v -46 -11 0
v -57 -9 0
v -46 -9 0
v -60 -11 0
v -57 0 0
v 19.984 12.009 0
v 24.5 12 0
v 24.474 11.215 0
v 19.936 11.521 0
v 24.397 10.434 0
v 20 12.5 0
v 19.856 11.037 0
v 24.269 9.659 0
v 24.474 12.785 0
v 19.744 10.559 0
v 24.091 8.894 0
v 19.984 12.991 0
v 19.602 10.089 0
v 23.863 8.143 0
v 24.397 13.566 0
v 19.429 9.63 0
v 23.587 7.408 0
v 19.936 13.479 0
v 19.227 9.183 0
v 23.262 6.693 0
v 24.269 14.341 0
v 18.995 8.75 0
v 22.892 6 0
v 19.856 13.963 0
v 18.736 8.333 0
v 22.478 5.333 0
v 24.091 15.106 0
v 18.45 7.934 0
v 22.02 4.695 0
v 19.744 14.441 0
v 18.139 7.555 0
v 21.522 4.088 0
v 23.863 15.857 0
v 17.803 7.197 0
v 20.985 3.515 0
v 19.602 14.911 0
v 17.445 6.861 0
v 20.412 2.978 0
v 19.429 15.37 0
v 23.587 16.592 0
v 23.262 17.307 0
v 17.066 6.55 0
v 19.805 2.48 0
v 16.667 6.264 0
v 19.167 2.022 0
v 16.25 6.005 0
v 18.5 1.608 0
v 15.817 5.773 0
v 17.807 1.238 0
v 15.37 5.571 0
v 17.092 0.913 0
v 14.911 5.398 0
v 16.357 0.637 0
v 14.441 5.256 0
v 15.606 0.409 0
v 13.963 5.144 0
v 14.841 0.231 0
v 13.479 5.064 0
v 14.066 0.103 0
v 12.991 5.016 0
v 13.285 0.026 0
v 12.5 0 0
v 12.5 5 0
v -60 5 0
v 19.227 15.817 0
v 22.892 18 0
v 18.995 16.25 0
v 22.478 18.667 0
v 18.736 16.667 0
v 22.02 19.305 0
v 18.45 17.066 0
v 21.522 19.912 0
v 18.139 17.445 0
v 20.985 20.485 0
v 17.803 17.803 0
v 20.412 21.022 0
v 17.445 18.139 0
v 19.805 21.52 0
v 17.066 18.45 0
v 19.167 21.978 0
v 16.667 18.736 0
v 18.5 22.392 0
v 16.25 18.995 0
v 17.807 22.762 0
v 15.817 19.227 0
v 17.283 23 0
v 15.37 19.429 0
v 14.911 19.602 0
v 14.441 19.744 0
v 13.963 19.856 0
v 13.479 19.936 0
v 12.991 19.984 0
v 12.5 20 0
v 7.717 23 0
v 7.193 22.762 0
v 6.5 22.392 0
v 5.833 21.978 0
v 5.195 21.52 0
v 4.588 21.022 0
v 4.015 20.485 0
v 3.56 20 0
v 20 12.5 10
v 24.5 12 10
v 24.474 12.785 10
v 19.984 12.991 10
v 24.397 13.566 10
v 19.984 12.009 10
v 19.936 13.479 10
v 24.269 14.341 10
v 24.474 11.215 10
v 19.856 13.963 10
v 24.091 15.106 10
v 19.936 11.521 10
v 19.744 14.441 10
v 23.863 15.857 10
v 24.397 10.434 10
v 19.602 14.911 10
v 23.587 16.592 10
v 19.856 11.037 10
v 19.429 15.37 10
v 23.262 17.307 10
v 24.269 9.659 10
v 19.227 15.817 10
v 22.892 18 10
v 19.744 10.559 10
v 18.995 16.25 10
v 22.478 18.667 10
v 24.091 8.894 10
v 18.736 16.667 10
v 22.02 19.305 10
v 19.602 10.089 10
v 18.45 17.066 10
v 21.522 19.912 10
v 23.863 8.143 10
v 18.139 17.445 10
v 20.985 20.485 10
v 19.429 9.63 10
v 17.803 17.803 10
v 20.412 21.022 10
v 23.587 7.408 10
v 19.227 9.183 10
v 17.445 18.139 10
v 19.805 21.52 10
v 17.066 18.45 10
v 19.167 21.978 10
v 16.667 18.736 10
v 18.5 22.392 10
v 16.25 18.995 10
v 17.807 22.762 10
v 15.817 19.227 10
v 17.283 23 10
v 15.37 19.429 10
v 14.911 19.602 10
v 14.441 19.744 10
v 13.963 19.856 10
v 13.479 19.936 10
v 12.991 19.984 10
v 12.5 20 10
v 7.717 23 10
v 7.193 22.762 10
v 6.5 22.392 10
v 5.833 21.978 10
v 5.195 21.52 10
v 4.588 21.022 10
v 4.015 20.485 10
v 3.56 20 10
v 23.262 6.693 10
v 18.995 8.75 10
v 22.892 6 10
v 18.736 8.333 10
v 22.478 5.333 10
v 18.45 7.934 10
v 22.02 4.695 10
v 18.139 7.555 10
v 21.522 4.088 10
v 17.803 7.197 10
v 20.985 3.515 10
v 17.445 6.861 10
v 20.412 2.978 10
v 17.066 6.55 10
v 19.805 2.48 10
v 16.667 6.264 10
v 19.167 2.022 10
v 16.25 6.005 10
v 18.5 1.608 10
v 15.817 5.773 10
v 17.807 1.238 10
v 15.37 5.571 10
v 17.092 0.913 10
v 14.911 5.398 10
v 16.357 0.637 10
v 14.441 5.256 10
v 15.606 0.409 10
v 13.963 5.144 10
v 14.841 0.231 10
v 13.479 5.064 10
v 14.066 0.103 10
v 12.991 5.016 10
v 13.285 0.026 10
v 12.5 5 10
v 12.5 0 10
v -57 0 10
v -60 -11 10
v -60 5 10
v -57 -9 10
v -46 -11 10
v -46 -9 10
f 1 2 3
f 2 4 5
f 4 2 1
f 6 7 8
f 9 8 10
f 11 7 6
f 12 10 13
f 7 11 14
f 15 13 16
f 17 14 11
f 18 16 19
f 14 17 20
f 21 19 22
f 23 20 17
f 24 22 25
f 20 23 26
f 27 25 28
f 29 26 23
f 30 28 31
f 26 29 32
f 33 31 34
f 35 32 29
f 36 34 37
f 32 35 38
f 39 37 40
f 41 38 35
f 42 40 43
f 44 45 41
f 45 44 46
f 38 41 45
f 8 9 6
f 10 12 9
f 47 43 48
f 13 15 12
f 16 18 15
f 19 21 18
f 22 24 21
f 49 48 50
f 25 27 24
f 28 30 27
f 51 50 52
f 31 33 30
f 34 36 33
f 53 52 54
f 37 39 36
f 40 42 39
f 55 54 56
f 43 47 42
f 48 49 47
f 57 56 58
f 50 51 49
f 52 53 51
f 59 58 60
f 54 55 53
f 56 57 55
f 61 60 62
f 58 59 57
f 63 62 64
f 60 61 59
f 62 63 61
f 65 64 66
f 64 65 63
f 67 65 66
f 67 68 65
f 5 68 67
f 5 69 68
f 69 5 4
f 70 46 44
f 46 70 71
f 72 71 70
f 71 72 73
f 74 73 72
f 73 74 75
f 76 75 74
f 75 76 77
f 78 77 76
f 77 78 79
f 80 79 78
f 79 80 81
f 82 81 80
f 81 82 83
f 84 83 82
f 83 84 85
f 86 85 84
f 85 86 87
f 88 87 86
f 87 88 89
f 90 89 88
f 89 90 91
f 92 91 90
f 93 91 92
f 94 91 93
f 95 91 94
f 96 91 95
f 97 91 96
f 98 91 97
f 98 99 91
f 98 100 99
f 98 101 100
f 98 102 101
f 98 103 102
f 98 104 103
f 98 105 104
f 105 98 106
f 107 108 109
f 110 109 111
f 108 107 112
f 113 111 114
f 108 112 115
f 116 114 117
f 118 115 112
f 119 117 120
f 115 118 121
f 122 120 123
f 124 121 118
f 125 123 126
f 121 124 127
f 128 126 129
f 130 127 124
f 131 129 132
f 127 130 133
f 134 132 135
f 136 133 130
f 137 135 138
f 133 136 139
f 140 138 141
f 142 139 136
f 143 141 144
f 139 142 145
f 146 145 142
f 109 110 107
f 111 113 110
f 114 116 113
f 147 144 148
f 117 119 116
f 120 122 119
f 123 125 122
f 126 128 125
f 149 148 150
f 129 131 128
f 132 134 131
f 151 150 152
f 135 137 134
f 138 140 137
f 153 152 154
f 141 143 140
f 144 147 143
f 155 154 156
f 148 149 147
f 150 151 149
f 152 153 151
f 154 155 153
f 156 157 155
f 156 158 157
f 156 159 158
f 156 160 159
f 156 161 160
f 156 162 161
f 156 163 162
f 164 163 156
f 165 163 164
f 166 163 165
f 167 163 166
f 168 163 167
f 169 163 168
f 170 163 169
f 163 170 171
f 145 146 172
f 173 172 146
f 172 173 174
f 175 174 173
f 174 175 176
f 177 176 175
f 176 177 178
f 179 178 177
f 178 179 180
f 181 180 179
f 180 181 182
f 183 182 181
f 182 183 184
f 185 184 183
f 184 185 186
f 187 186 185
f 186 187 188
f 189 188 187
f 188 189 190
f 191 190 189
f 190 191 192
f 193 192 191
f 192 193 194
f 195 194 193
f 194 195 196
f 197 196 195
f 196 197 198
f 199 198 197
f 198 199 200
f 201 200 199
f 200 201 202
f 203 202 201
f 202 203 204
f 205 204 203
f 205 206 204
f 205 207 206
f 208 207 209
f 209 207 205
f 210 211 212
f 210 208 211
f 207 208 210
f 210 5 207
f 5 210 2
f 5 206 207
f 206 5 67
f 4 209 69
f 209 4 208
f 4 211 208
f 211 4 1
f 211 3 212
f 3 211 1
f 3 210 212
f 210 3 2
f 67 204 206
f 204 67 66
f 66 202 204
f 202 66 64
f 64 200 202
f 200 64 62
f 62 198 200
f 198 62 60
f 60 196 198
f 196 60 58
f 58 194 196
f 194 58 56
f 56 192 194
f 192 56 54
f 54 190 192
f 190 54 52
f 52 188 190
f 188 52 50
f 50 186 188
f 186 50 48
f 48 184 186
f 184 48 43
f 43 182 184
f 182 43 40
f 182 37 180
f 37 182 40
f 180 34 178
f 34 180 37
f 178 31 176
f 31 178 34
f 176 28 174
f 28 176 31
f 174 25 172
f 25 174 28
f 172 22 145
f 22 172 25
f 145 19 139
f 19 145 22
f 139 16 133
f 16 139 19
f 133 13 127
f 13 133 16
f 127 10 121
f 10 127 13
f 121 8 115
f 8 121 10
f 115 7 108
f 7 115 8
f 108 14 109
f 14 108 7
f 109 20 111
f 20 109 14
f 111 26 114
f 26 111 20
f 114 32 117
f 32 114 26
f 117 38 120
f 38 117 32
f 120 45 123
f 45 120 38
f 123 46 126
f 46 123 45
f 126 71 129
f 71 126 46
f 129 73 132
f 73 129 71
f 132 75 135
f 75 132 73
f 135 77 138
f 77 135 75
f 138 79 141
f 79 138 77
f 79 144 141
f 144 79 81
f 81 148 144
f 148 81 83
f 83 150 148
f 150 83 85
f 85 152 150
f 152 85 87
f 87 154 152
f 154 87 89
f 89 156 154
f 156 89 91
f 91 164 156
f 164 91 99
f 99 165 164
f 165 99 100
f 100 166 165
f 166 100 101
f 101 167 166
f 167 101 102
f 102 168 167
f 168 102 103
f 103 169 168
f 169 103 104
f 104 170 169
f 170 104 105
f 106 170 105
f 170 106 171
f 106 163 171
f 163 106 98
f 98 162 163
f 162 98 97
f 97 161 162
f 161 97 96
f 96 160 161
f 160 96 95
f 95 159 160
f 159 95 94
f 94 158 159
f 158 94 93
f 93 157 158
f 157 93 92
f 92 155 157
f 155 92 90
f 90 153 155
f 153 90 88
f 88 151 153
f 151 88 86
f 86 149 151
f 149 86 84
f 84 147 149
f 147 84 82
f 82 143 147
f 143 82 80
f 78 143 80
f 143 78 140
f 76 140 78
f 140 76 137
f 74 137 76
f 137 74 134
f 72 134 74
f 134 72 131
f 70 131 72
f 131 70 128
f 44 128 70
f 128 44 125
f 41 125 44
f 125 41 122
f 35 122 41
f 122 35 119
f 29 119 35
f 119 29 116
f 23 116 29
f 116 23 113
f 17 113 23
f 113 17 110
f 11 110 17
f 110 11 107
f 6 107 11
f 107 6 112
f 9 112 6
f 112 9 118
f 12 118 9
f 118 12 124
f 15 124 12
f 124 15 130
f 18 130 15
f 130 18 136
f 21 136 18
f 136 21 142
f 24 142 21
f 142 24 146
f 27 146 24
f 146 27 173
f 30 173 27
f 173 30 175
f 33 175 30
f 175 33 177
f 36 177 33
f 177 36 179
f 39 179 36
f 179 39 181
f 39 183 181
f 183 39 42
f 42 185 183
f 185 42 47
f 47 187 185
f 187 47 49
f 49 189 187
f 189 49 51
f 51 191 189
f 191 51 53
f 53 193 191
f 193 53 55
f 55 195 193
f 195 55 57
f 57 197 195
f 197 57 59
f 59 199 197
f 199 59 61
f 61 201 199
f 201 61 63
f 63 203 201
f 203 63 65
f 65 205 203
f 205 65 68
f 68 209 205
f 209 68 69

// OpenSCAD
/* [Global] */
/* [hook tuning] */
// The width of the hook
width = 10;
// The height / length of the hook
height = 60; //
/* [door specs] */
// The depth of the door mount. Use the depth of your door
doordepth = 9; //
// The heigth of the door mount
doorheight = 11; //

/* [Hidden] */
$fn = 96;

module aufhaenger(){
    difference(){
        square([doorheight+3, doordepth+2]);
        translate([3, 2])square([doorheight, doordepth]);
    }
    
}

module haken(){
    difference(){
        union(){
            translate([-height, 0])square([height, 5]);
            square([12.5, 20]);
            translate([12.5, 12])circle(12);
        }
        translate([0, 5])square([12.5, 15]);
        translate([12.5, 12.5])circle(7.5);
        translate([0, 23])square([40, 10]);
    }
}

module TuerHaken(){
    union(){
        linear_extrude(width)translate([-height, -doordepth-2])aufhaenger();
        linear_extrude(width)haken();
    }
}

TuerHaken();
